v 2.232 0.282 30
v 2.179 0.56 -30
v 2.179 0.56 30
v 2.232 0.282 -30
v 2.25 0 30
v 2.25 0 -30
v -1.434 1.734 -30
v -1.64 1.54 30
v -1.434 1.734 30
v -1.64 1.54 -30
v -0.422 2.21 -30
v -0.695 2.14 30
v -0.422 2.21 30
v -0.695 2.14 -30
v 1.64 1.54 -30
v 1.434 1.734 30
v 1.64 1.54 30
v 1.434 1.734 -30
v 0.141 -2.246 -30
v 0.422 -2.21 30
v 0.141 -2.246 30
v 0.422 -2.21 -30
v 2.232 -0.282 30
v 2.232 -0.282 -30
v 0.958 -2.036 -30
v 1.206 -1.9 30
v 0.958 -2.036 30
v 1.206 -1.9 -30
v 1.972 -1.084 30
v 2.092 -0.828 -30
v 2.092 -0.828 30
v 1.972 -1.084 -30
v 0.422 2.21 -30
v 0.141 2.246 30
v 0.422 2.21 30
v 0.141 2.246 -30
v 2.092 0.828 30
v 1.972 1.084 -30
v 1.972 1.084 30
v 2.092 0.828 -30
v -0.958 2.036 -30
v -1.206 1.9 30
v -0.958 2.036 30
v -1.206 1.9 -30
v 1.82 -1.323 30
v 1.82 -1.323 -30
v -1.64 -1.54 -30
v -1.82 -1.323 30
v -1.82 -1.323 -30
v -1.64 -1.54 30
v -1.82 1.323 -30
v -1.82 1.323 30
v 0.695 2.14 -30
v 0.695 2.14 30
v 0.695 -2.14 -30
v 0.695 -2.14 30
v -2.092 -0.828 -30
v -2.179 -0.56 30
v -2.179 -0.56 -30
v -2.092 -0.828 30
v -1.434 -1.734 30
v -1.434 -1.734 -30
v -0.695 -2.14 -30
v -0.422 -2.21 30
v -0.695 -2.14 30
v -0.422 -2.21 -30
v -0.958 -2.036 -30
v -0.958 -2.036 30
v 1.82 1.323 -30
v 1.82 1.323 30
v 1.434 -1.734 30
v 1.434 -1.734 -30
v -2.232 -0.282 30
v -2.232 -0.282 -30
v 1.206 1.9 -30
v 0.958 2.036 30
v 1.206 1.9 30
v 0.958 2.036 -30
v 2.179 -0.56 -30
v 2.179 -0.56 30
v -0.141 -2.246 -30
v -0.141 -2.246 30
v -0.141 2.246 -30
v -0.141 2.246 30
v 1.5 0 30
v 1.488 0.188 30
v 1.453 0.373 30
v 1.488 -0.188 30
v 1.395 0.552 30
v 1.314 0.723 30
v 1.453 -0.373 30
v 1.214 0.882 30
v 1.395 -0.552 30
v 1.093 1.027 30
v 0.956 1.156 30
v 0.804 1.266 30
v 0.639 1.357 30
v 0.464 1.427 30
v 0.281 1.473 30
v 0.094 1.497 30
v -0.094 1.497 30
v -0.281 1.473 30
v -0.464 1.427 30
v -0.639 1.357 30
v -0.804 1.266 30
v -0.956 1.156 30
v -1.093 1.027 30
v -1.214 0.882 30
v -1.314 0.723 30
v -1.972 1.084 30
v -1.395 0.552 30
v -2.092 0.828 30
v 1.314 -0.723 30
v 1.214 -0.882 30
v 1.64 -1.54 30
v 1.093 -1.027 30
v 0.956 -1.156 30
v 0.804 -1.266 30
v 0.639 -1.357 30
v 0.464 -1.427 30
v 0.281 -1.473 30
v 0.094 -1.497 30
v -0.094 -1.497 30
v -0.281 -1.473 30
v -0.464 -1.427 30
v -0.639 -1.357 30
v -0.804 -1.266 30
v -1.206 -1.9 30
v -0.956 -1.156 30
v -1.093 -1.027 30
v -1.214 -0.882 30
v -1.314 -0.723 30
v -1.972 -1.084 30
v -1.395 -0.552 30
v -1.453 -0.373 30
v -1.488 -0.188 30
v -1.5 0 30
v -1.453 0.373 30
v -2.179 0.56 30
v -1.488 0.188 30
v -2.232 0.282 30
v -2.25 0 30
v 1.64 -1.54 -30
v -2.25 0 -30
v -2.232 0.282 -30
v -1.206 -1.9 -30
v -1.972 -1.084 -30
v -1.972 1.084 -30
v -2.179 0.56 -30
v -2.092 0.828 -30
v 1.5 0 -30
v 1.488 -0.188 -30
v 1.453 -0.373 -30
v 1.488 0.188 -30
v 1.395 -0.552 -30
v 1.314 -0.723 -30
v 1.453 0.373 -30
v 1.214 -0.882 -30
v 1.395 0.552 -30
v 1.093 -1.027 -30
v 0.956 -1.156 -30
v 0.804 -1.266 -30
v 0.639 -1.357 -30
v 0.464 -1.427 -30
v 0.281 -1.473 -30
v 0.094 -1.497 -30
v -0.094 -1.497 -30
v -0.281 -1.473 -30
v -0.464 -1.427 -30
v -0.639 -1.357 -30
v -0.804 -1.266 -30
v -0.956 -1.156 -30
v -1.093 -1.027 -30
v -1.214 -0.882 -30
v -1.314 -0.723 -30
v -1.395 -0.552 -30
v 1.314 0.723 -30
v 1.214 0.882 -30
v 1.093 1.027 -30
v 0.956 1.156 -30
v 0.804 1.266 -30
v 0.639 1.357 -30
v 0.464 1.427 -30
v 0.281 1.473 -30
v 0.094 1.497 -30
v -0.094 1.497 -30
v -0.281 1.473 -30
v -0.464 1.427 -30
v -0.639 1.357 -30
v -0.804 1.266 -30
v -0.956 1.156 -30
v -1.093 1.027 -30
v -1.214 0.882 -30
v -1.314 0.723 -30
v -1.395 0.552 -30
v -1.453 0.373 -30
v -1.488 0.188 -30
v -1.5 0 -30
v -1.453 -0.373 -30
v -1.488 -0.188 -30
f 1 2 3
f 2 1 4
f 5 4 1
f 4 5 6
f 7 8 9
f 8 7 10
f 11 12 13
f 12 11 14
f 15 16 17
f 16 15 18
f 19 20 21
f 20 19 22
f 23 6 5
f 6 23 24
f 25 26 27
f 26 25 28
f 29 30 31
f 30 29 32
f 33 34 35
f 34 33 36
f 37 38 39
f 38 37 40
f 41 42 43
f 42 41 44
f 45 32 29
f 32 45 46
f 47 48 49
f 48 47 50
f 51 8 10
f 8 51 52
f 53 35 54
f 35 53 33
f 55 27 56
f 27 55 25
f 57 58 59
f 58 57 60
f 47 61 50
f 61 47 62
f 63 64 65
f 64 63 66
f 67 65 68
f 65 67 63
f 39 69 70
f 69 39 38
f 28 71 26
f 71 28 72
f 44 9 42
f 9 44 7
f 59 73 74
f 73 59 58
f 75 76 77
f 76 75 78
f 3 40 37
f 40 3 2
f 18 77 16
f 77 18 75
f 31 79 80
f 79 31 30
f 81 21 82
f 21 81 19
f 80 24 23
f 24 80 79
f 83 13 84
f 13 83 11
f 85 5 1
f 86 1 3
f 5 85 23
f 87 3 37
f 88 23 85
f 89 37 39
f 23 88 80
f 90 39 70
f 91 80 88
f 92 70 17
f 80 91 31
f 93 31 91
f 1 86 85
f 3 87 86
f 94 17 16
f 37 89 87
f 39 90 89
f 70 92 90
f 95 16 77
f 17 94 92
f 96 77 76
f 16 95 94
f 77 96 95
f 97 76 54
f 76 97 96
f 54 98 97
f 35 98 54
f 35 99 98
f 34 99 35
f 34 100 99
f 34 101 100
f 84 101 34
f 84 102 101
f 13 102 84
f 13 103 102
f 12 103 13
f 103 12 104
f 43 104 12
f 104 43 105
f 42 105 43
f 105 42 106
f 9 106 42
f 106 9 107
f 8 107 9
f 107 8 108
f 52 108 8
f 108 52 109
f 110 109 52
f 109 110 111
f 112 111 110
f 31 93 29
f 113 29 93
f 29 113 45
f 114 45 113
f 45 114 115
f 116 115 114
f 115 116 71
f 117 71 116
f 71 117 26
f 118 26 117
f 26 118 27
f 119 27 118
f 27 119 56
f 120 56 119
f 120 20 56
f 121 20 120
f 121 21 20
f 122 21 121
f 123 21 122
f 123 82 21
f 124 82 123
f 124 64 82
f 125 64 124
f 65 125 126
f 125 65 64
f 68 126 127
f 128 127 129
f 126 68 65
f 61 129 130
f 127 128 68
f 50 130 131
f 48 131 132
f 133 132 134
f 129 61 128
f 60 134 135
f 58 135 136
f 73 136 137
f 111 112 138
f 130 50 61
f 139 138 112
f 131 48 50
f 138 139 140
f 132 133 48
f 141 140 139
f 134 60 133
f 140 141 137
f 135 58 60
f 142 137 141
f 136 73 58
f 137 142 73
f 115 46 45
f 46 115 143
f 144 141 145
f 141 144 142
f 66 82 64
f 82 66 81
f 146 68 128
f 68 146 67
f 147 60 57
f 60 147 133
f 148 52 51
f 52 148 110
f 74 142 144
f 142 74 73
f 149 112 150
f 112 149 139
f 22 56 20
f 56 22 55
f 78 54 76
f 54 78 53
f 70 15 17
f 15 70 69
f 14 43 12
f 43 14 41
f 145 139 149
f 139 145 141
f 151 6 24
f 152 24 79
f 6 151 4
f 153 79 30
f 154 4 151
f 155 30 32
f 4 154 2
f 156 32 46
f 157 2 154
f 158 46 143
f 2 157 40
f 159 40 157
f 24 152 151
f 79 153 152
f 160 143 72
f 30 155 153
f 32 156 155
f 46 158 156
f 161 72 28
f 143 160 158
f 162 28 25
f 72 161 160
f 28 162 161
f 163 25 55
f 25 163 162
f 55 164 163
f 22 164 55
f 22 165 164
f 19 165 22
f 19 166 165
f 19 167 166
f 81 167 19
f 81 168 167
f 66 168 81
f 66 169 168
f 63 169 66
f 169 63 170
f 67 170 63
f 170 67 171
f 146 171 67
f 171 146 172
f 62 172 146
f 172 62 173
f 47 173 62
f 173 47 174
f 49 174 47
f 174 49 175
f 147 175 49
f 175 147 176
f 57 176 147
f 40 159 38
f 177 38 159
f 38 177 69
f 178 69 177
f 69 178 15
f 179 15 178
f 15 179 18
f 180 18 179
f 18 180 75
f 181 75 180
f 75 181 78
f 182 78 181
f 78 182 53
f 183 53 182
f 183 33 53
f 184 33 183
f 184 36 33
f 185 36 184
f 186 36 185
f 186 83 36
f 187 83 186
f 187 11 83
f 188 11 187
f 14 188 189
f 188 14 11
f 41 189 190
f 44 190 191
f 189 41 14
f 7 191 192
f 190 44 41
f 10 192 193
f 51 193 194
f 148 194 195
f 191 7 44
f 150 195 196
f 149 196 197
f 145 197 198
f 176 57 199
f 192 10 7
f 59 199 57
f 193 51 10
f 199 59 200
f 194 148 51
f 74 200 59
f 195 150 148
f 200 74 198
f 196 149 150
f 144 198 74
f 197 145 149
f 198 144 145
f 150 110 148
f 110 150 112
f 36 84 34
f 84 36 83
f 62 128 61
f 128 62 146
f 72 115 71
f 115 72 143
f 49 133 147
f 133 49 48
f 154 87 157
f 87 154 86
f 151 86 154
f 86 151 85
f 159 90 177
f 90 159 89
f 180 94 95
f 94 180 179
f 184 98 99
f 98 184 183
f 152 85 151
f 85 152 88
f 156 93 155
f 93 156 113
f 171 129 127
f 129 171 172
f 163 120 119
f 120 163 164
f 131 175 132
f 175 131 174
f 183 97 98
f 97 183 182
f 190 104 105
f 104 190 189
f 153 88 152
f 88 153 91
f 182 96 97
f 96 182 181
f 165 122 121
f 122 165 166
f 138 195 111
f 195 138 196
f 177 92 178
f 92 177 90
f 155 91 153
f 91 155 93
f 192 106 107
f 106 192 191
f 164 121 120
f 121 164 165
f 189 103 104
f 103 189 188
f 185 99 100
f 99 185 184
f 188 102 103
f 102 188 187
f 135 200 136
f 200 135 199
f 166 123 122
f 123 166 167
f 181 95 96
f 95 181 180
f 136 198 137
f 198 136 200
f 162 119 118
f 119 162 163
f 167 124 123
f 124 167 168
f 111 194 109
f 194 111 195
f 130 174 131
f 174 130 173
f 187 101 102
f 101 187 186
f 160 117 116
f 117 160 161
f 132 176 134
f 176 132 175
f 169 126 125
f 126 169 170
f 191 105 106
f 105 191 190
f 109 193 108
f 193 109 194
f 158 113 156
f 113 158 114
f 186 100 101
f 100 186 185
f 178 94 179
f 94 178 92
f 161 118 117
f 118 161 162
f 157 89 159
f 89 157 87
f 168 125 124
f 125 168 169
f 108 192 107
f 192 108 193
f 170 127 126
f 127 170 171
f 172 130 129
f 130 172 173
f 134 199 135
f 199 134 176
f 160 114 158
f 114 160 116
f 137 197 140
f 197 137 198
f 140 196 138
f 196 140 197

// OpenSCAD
$fn = 50;


difference() {
	union() {
		translate(v = [0, 0, -30.0000000000]) {
			cylinder(h = 60, r = 2.2500000000);
		}
	}
	union() {
		translate(v = [0, 0, -100.0000000000]) {
			cylinder(h = 200, r = 1.5000000000);
		}
	}
}
